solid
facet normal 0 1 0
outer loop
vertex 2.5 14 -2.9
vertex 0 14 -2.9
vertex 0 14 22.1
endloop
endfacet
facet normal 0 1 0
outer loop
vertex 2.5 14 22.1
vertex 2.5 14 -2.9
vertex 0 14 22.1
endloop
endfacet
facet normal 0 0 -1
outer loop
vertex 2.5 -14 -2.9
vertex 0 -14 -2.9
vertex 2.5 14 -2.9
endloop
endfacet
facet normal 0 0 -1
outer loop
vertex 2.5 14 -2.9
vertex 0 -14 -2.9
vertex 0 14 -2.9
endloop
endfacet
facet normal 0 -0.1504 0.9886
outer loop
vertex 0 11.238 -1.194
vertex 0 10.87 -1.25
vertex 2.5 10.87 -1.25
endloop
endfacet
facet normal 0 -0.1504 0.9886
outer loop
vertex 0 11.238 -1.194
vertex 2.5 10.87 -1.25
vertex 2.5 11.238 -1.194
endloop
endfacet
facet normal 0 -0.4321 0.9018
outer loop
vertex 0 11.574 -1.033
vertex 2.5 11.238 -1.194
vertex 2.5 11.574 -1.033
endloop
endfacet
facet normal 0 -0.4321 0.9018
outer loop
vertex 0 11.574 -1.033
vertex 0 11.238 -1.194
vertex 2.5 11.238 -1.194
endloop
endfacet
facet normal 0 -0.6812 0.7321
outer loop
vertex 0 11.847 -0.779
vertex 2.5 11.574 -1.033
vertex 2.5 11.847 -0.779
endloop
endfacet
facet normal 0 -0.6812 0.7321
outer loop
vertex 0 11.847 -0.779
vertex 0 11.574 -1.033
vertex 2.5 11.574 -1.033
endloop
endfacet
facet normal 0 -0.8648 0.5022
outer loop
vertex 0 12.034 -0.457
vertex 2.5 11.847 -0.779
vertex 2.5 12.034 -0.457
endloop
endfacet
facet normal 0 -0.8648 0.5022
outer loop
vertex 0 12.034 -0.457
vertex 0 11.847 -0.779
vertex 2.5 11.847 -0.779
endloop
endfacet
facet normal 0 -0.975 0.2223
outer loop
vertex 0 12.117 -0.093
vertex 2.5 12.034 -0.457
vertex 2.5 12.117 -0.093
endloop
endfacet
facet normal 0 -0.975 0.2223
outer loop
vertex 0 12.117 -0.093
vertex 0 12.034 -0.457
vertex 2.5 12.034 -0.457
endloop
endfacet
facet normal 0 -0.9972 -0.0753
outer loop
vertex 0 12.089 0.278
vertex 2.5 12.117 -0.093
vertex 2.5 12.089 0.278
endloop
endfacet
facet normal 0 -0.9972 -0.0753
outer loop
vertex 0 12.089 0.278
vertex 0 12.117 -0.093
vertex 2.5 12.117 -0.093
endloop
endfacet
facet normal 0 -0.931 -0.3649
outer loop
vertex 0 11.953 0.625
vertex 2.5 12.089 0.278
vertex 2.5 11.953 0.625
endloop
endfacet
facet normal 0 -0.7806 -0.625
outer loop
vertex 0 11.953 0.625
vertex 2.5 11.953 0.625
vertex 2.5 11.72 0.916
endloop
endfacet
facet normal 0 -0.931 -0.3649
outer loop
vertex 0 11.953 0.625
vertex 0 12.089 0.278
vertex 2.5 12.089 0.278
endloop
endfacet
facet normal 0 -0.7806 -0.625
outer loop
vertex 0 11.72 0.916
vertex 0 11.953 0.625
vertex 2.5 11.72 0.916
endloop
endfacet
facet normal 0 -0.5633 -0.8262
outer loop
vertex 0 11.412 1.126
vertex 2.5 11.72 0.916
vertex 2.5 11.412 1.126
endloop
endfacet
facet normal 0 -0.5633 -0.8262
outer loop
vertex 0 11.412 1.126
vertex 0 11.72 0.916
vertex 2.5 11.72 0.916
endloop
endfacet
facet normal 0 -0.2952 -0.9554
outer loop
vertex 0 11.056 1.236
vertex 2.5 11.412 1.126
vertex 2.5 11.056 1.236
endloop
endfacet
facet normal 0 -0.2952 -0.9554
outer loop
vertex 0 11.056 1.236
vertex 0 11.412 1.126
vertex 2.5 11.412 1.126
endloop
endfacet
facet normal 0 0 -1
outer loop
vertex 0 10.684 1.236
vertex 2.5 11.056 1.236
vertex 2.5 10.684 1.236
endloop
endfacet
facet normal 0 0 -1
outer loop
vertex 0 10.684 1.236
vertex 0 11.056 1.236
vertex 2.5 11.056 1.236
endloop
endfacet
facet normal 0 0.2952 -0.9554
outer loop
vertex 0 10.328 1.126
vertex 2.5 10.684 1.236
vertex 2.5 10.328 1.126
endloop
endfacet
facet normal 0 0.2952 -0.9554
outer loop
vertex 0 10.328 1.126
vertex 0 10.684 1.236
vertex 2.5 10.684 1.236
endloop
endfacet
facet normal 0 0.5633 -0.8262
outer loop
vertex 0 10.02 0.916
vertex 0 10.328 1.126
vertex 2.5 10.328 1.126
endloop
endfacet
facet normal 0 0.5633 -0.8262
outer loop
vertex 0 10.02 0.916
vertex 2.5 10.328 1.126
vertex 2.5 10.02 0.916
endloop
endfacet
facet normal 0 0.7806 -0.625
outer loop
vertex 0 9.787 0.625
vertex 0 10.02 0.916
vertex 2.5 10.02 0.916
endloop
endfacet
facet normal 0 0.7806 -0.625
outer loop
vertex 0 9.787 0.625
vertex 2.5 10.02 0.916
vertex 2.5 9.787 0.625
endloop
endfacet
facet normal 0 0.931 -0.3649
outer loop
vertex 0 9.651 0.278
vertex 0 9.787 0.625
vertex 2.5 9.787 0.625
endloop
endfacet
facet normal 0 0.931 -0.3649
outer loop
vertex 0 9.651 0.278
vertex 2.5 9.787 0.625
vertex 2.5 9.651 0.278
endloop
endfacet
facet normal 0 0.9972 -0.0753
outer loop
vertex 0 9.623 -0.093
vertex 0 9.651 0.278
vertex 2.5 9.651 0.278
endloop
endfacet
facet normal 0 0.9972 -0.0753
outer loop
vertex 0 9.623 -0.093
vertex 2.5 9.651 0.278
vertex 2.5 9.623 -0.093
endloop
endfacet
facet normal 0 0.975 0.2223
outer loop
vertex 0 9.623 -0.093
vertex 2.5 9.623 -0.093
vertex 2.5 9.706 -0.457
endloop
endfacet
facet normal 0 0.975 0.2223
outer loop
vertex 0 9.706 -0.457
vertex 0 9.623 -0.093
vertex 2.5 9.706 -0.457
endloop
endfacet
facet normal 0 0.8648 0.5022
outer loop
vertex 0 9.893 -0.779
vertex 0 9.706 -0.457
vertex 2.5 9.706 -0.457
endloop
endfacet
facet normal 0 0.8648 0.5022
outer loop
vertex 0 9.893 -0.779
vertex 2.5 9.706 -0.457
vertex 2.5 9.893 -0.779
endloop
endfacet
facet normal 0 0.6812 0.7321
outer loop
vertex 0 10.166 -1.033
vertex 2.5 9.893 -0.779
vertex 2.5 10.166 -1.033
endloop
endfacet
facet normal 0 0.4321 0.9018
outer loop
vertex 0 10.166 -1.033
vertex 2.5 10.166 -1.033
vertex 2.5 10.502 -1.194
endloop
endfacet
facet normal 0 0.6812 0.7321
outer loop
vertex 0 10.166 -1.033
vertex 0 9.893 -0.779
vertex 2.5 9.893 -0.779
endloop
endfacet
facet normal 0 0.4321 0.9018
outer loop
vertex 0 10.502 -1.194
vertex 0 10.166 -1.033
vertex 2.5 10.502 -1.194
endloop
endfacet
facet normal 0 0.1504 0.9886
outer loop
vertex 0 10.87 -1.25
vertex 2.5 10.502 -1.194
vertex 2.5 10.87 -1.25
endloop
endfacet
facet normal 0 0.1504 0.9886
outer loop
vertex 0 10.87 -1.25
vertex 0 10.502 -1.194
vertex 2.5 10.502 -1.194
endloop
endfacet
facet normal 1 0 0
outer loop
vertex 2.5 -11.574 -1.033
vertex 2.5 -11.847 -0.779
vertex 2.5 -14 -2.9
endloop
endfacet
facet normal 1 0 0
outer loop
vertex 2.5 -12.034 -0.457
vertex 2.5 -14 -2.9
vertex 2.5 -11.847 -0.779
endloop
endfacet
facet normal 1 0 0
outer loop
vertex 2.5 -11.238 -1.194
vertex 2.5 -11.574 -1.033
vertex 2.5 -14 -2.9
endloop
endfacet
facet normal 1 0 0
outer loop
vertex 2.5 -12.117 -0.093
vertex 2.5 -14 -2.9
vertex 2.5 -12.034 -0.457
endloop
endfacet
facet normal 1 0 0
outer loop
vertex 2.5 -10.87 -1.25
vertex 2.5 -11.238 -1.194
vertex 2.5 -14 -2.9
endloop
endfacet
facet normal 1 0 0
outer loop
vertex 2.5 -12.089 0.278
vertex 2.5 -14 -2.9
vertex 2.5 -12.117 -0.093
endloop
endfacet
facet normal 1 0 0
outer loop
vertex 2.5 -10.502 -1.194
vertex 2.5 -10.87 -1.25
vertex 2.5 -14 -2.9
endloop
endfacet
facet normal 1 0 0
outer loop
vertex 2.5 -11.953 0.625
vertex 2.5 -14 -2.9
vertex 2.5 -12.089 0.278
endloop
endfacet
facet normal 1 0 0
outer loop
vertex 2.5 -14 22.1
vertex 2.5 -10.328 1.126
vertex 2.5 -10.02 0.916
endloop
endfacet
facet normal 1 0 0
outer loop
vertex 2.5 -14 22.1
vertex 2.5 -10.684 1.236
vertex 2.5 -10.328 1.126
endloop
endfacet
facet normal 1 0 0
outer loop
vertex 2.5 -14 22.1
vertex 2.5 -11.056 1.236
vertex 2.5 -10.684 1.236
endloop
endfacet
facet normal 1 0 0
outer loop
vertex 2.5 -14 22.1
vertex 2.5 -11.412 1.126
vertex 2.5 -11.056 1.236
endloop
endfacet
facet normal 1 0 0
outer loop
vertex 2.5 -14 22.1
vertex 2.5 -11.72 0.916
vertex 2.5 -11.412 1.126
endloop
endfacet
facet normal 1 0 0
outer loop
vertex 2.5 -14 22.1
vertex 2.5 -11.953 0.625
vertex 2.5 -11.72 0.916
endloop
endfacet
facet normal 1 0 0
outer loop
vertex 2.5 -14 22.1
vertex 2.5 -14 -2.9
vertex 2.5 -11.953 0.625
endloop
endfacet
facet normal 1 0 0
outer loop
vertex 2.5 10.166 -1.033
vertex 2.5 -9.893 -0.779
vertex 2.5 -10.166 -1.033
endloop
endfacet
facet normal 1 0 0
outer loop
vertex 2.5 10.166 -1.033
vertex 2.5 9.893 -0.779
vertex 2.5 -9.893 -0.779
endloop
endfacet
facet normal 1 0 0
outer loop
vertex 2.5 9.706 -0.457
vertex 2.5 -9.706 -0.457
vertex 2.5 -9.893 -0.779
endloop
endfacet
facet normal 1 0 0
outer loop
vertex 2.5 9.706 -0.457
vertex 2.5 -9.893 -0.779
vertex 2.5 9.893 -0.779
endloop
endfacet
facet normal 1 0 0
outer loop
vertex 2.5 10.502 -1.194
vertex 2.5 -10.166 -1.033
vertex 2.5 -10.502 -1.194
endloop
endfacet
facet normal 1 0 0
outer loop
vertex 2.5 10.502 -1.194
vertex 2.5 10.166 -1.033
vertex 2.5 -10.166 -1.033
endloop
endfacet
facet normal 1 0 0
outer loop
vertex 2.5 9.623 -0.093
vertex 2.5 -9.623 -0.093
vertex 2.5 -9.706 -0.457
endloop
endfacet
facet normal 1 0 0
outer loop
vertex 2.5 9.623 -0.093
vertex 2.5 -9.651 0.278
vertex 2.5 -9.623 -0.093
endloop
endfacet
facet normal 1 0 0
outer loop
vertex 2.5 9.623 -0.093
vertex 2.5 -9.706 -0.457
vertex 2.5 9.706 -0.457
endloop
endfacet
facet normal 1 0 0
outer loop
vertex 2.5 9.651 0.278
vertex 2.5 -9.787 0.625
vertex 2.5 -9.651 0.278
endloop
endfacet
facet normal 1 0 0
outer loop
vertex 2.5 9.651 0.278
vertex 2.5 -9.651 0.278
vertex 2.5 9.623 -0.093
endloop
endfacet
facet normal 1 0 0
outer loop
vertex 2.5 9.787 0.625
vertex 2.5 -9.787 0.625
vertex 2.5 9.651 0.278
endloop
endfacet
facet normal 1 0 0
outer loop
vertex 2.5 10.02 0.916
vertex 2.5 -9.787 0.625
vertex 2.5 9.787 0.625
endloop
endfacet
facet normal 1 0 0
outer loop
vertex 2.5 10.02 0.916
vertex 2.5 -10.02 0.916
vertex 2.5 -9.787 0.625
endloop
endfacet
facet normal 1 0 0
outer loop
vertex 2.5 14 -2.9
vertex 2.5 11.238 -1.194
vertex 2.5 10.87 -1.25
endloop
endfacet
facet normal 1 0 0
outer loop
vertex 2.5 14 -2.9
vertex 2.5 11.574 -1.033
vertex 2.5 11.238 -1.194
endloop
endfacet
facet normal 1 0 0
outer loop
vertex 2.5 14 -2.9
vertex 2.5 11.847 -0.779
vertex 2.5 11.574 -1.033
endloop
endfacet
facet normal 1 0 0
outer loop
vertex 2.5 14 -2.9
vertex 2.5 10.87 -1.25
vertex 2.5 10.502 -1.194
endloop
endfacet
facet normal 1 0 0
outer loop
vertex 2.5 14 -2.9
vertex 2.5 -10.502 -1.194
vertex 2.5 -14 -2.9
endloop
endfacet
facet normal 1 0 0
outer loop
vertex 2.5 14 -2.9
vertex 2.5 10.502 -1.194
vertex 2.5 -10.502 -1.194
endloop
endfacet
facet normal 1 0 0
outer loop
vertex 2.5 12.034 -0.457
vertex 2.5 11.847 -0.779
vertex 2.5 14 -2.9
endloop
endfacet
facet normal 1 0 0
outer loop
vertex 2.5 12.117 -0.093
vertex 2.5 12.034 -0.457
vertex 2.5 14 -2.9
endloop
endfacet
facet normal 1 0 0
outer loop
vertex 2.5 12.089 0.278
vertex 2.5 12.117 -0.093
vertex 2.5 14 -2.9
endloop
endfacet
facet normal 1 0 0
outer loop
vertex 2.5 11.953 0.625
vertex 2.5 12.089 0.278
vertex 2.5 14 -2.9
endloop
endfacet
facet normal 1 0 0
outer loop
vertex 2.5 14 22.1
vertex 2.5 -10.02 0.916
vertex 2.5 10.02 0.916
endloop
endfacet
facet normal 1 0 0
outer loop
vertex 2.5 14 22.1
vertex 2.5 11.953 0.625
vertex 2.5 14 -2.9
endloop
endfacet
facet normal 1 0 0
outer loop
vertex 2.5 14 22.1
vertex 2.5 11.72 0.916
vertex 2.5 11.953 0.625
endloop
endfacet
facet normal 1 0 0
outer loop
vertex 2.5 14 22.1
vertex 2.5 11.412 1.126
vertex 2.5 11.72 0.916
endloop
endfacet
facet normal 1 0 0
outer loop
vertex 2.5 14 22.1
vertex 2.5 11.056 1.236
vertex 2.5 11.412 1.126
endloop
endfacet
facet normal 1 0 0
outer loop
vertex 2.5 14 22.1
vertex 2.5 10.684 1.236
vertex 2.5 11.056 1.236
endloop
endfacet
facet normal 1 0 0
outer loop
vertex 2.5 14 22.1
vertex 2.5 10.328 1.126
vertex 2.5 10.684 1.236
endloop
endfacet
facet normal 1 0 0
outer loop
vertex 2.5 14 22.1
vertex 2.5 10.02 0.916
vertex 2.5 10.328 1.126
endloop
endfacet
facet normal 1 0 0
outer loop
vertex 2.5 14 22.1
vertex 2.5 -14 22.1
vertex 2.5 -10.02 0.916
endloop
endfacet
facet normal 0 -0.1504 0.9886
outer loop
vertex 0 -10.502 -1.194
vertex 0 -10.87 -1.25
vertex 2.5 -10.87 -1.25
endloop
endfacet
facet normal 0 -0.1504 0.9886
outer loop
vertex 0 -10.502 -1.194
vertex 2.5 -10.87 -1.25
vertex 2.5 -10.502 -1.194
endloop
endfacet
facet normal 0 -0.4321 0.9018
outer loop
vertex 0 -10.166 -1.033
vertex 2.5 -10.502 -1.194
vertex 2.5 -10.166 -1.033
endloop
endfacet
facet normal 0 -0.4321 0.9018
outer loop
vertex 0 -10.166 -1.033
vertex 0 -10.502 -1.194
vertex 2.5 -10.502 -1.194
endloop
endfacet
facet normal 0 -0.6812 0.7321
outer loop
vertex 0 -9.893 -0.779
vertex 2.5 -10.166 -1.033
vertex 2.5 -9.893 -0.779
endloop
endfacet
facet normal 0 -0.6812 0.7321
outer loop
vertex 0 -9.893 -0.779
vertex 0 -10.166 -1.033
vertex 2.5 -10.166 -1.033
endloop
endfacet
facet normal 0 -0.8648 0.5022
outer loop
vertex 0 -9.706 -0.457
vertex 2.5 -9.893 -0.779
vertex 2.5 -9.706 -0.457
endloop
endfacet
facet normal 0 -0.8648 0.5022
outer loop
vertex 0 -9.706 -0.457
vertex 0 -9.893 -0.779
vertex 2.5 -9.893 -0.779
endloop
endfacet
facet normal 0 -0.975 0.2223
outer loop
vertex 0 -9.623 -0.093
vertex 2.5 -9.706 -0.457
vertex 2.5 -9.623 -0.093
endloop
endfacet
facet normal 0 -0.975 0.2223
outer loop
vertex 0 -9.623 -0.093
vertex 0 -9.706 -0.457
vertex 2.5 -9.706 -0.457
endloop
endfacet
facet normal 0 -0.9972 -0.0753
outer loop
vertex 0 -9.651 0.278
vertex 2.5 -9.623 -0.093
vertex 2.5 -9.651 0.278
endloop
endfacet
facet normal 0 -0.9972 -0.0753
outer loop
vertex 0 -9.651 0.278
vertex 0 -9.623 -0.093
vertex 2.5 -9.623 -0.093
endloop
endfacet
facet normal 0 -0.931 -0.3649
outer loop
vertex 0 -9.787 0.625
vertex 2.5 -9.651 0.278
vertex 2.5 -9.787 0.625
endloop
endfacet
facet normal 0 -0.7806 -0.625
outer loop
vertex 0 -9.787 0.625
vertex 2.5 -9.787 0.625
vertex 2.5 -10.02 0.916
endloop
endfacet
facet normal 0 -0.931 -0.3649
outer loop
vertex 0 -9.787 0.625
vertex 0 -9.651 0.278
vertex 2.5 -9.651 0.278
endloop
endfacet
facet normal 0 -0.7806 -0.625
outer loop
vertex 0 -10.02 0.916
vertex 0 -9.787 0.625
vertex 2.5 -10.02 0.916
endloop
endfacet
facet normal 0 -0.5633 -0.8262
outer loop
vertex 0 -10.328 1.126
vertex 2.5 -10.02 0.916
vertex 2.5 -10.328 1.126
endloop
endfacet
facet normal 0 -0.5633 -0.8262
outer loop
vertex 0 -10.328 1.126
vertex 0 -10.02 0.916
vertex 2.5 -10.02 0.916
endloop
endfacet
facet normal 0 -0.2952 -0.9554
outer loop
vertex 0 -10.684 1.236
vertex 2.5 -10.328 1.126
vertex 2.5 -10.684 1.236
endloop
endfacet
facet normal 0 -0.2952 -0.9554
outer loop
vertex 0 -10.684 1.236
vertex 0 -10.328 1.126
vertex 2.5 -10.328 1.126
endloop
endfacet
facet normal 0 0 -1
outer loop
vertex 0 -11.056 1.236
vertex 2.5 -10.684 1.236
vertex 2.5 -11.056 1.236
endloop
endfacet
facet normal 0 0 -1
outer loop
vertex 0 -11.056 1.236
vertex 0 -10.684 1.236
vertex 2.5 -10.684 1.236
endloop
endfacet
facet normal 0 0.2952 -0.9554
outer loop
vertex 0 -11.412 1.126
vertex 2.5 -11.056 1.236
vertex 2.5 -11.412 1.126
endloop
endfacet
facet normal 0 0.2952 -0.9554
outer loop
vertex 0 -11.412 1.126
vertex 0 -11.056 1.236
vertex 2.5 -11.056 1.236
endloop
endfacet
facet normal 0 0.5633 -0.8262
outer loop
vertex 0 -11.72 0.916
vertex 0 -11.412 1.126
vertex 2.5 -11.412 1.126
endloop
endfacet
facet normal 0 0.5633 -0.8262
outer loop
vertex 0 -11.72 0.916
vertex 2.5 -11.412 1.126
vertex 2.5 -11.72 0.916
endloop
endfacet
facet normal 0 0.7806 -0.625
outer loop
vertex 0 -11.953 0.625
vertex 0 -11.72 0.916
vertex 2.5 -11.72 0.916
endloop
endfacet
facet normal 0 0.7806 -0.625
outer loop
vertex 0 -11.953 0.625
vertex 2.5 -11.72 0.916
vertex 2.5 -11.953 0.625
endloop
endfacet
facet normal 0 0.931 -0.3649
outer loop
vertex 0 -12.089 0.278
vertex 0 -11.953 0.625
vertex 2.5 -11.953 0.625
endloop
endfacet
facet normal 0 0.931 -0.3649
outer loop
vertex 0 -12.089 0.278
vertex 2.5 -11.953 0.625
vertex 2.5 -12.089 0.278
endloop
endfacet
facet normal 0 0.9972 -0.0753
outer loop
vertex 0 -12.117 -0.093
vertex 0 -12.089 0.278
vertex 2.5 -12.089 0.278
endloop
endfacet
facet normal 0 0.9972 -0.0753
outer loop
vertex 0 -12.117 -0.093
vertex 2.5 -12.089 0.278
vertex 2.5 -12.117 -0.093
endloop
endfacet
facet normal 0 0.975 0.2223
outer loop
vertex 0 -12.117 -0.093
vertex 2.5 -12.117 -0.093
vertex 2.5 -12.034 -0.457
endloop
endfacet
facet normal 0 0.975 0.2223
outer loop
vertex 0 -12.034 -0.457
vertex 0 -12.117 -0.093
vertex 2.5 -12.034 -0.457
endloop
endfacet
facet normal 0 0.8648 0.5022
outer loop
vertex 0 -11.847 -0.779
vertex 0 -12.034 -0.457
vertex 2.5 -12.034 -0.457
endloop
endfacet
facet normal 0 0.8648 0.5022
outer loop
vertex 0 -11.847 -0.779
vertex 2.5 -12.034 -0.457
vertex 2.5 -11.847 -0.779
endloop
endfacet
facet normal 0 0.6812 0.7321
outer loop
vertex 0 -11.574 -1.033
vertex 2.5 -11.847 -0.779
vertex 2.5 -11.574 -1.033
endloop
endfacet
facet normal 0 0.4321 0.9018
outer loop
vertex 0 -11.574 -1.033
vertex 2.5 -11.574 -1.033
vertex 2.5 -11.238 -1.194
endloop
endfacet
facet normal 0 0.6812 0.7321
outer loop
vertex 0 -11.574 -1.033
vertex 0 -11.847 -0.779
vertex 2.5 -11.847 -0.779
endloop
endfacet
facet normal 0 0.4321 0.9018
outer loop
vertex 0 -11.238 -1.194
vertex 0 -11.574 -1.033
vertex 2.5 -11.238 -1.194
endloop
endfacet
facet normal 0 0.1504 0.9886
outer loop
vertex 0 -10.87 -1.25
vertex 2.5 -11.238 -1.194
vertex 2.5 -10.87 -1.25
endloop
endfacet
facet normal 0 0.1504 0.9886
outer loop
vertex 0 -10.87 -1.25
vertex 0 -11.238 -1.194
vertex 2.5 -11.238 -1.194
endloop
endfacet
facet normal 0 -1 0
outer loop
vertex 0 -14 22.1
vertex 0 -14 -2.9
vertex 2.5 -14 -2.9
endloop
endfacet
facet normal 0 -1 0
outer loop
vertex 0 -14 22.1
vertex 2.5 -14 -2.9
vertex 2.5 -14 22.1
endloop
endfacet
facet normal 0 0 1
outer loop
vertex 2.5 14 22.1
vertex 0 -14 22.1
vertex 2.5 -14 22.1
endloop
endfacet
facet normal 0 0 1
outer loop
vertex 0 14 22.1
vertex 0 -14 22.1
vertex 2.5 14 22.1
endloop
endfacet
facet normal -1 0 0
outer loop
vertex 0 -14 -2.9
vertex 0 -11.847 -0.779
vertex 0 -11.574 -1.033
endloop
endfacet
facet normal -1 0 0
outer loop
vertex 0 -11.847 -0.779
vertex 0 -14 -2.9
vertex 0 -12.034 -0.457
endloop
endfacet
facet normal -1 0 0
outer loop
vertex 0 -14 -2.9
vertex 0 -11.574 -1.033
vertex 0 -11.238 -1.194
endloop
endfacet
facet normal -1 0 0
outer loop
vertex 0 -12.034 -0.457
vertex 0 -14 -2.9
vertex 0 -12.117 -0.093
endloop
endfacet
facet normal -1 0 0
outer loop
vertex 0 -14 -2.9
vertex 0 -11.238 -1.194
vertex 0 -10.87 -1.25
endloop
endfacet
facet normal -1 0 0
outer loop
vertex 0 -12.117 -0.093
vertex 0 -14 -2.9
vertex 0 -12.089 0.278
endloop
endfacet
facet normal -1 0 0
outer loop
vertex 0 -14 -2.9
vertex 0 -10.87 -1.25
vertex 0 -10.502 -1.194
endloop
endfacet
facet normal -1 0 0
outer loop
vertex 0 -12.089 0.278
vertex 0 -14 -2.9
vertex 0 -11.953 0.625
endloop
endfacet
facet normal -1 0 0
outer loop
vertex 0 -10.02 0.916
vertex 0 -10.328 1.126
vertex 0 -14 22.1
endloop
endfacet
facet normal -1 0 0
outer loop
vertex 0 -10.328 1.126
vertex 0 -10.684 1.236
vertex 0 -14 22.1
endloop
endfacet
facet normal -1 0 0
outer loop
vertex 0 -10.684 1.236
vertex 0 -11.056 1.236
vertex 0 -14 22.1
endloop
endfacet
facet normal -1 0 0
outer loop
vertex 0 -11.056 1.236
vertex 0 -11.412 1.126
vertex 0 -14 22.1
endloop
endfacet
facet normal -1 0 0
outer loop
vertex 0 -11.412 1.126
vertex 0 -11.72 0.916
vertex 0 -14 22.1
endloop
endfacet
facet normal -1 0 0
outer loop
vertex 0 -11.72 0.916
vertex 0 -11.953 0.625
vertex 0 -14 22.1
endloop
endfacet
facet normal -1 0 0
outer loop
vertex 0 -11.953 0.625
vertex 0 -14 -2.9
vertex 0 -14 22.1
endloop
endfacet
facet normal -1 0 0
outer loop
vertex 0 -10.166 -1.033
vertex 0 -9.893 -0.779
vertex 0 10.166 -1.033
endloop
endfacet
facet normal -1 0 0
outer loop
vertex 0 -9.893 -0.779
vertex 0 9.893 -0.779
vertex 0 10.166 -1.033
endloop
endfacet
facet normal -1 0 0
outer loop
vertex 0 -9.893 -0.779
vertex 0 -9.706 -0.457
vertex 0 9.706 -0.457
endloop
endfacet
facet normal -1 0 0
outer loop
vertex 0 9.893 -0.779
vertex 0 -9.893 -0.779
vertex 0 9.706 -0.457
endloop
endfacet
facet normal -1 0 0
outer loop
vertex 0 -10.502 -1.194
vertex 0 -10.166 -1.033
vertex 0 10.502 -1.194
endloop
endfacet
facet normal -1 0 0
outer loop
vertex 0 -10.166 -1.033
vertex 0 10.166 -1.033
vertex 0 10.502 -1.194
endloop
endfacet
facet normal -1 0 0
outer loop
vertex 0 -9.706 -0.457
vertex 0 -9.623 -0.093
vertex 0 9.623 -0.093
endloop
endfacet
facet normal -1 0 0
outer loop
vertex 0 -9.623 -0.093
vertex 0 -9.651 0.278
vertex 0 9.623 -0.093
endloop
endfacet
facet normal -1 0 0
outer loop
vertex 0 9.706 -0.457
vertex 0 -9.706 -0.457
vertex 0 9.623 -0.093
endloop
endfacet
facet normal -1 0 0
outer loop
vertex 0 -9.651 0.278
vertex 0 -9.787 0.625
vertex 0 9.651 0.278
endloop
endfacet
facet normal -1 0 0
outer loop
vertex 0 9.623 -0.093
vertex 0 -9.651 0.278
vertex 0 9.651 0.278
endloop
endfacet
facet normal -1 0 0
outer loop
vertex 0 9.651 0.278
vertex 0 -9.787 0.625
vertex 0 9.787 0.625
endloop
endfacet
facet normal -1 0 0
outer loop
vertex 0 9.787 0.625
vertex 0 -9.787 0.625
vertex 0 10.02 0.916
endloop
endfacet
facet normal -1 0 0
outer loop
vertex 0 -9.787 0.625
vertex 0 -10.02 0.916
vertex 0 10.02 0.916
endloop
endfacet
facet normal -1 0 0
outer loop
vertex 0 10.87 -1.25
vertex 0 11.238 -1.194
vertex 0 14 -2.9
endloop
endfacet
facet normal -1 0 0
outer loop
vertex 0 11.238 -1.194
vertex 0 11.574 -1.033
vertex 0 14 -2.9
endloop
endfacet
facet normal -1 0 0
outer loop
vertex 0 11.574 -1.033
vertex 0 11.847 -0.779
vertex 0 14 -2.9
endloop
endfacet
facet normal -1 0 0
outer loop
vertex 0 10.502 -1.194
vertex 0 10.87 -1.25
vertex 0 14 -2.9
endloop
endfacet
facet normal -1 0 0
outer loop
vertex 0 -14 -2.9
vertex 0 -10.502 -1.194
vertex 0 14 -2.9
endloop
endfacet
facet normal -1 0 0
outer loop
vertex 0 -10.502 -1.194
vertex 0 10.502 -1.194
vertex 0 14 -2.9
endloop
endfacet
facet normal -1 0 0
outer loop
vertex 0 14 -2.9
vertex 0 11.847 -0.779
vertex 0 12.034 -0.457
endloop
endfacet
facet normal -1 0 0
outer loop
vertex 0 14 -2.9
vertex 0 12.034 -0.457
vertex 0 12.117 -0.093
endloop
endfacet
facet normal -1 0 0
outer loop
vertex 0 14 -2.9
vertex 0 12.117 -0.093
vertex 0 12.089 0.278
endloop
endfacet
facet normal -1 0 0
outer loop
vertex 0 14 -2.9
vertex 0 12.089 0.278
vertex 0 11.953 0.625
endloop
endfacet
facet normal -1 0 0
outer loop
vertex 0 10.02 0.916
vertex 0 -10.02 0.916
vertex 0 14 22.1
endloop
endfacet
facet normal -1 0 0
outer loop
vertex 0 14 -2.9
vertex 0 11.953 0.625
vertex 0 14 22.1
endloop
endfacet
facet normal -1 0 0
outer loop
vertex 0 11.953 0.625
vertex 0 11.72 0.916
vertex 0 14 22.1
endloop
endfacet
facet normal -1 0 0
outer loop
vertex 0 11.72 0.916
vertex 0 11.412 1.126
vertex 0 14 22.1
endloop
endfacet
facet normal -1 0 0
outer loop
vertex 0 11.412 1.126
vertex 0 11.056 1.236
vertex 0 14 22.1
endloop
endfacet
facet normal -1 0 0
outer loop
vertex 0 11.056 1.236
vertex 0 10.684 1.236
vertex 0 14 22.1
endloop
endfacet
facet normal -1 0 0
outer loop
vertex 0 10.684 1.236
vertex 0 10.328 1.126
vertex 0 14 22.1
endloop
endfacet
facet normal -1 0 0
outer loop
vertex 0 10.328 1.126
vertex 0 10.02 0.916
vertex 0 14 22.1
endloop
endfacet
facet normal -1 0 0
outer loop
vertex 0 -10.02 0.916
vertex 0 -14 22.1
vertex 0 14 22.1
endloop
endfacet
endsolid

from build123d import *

# Parameters (mm, degrees)
IZIM1_W                     = 28
IZIM1_H                     = 25
IZIM1_R                     = 1.25
Y_KSEKLIK_EKSTR_ZYON1_DEPTH = 2.5


with BuildPart() as part:
    # Çizim1 → Yükseklik-Ekstrüzyon1 (new body)
    with BuildSketch(Plane.YZ):
        with Locations((0, 9.6)):
            Rectangle(IZIM1_W, IZIM1_H)
        with Locations(Location((-10.87, 0, 0), (0, 0, 270))):
            Circle(IZIM1_R, mode=Mode.SUBTRACT)
        with Locations(Location((10.87, 0, 0), (0, 0, 270))):
            Circle(IZIM1_R, mode=Mode.SUBTRACT)
    extrude(amount=Y_KSEKLIK_EKSTR_ZYON1_DEPTH)


solid = part.part
